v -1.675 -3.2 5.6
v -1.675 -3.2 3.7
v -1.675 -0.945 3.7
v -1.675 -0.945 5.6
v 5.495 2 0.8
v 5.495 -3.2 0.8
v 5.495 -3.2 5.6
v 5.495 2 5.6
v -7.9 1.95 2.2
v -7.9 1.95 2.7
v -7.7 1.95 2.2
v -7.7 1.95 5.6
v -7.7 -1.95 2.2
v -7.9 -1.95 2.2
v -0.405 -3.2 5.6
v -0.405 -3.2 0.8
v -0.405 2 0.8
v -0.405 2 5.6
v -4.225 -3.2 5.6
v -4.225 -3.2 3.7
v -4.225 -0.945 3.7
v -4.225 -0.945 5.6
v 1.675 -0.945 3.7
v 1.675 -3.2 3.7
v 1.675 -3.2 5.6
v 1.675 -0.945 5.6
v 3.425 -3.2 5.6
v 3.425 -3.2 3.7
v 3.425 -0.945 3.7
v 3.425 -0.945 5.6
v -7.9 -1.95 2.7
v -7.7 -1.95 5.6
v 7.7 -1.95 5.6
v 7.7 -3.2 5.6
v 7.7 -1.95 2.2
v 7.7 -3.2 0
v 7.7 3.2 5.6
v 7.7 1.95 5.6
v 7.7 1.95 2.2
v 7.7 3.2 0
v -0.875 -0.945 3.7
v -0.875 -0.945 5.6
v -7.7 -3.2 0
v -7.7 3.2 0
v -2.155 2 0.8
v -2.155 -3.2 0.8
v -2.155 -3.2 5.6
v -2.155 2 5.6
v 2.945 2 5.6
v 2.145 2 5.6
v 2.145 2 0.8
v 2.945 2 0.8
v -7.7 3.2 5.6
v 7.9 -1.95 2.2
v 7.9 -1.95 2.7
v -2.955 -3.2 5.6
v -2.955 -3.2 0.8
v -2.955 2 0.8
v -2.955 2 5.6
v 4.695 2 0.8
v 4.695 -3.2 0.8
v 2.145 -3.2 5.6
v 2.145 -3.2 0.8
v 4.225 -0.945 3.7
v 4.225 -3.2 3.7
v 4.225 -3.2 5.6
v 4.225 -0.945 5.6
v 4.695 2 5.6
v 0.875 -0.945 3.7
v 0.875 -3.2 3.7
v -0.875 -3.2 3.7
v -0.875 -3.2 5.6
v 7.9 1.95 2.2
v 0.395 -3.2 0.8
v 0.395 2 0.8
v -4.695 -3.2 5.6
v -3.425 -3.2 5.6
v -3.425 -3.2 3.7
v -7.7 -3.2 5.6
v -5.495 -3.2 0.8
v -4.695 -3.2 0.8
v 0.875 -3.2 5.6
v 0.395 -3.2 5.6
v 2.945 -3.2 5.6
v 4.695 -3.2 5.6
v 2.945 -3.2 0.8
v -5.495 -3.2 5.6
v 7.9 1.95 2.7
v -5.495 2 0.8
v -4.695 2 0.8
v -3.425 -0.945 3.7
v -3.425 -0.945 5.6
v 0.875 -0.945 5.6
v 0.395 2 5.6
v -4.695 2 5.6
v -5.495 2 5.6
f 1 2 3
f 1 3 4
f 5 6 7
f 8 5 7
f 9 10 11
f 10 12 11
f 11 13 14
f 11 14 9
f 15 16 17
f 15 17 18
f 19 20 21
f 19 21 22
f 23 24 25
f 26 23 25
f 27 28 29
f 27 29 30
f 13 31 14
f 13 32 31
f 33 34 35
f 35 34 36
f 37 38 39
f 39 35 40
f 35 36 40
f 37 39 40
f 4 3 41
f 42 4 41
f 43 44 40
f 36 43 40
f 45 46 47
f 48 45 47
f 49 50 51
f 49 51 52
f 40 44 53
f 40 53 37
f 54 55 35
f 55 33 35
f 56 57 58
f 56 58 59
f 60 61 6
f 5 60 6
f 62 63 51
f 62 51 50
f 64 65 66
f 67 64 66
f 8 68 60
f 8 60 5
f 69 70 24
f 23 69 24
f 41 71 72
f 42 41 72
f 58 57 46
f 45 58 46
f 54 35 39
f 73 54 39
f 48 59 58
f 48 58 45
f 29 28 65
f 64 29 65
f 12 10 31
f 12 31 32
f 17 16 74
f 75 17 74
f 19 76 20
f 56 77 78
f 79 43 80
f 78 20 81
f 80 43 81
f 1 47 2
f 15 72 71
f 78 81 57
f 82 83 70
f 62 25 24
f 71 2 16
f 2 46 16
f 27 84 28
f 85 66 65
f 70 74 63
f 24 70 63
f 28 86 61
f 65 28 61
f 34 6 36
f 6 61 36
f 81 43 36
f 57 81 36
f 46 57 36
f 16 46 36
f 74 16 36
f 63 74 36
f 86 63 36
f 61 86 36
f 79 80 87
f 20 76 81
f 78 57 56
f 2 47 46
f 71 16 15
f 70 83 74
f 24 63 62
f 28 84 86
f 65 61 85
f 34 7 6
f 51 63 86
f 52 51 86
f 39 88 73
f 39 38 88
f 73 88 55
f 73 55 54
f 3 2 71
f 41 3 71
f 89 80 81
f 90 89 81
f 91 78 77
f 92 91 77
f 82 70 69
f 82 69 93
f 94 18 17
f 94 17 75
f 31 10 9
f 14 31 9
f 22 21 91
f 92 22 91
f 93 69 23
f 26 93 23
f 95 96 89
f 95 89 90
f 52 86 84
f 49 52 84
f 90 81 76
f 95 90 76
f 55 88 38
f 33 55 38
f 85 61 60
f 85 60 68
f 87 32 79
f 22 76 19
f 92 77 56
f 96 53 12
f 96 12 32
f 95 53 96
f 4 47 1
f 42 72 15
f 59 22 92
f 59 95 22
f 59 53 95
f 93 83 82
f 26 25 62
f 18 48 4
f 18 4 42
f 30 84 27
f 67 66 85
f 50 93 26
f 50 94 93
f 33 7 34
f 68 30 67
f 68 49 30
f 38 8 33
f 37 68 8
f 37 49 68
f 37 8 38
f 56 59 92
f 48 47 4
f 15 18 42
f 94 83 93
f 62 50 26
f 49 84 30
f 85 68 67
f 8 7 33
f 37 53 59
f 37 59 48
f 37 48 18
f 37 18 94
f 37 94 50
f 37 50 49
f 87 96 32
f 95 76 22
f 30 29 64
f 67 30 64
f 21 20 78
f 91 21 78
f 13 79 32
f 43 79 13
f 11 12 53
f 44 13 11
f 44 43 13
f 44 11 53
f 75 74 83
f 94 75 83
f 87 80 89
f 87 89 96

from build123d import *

# Parameters (mm, degrees)
SKETCH1_W           = 15.4
SKETCH1_H           = 6.4
BOSS_EXTRUDE1_DEPTH = 5.6
SKETCH2_W           = 0.8
SKETCH2_H           = 4.8
SKETCH2_H_2         = 1.9
CUT_EXTRUDE1_DEPTH  = 5.2
SKETCH3_W           = 3.4
SKETCH3_H           = 3.9
BOSS_EXTRUDE2_DEPTH = 0.2
CUT_EXTRUDE2_REACH  = 12.968
SKETCH5_W           = 0.8
SKETCH5_H           = 2.945
BOSS_EXTRUDE3_DEPTH = 1.9


with BuildPart() as part:
    # Sketch1 → Boss-Extrude1 (new body)
    with BuildSketch(Plane.XY):
        Rectangle(SKETCH1_W, SKETCH1_H)
    extrude(amount=BOSS_EXTRUDE1_DEPTH)

    # Sketch2 → Cut-Extrude1 (cut)
    with BuildSketch(Plane.XZ.offset(3.2)):
        with Locations((5.095, 3.2)):
            Rectangle(SKETCH2_W, SKETCH2_H)
        with Locations((2.545, 3.2)):
            Rectangle(SKETCH2_W, SKETCH2_H)
        with Locations((-0.005, 3.2)):
            Rectangle(SKETCH2_W, SKETCH2_H)
        with Locations((-2.555, 3.2)):
            Rectangle(SKETCH2_W, SKETCH2_H)
        with Locations((-5.095, 3.2)):
            Rectangle(SKETCH2_W, SKETCH2_H)
        with Locations((3.825, 4.65)):
            Rectangle(SKETCH2_W, SKETCH2_H_2)
        with Locations((1.275, 4.65)):
            Rectangle(SKETCH2_W, SKETCH2_H_2)
        with Locations((-1.275, 4.65)):
            Rectangle(SKETCH2_W, SKETCH2_H_2)
        with Locations((-3.825, 4.65)):
            Rectangle(SKETCH2_W, SKETCH2_H_2)
    extrude(amount=-CUT_EXTRUDE1_DEPTH, mode=Mode.SUBTRACT)

    # Sketch3 → Boss-Extrude2 (add)
    with BuildSketch(Plane(origin=(7.7, 0, 0), x_dir=(0, 0, -1), z_dir=(1, 0, 0))):
        with Locations((-3.9, 0)):
            Rectangle(SKETCH3_W, SKETCH3_H)
    boss_extrude2 = extrude(amount=BOSS_EXTRUDE2_DEPTH)

    # Sketch4 → Cut-Extrude2 (cut, up to next)
    with BuildSketch(Plane(origin=(0, 1.95, 0), x_dir=(1, 0, 0), z_dir=(0, 1, 0)), mode=Mode.PRIVATE) as cut_extrude2_sk1:
        Polygon((7.9, -2.7), (7.7, -5.6), (7.9, -5.6), align=None)
    cut_extrude2_tool1 = extrude(cut_extrude2_sk1.sketch, amount=-CUT_EXTRUDE2_REACH, mode=Mode.PRIVATE) & part.part
    cut_extrude2 = cut_extrude2_tool1.solids().sort_by_distance((7.833333, 1.95, 4.633333))[0]
    add(cut_extrude2, mode=Mode.SUBTRACT)

    # Mirror1: Boss-Extrude2, Cut-Extrude2 across plane
    add(boss_extrude2.mirror(Plane(origin=(0, 0, 0), x_dir=(0, 0, 1), z_dir=(1, 0, 0))))
    add(cut_extrude2.mirror(Plane(origin=(0, 0, 0), x_dir=(0, 0, 1), z_dir=(1, 0, 0))), mode=Mode.SUBTRACT)

    # Sketch5 → Boss-Extrude3 (add)
    with BuildSketch(Plane.XY.offset(3.7)):
        with Locations((-3.825, 0.5275)):
            Rectangle(SKETCH5_W, SKETCH5_H)
        with Locations((-1.275, 0.5275)):
            Rectangle(SKETCH5_W, SKETCH5_H)
        with Locations((1.275, 0.5275)):
            Rectangle(SKETCH5_W, SKETCH5_H)
        with Locations((3.825, 0.5275)):
            Rectangle(SKETCH5_W, SKETCH5_H)
    extrude(amount=BOSS_EXTRUDE3_DEPTH)


solid = part.part
